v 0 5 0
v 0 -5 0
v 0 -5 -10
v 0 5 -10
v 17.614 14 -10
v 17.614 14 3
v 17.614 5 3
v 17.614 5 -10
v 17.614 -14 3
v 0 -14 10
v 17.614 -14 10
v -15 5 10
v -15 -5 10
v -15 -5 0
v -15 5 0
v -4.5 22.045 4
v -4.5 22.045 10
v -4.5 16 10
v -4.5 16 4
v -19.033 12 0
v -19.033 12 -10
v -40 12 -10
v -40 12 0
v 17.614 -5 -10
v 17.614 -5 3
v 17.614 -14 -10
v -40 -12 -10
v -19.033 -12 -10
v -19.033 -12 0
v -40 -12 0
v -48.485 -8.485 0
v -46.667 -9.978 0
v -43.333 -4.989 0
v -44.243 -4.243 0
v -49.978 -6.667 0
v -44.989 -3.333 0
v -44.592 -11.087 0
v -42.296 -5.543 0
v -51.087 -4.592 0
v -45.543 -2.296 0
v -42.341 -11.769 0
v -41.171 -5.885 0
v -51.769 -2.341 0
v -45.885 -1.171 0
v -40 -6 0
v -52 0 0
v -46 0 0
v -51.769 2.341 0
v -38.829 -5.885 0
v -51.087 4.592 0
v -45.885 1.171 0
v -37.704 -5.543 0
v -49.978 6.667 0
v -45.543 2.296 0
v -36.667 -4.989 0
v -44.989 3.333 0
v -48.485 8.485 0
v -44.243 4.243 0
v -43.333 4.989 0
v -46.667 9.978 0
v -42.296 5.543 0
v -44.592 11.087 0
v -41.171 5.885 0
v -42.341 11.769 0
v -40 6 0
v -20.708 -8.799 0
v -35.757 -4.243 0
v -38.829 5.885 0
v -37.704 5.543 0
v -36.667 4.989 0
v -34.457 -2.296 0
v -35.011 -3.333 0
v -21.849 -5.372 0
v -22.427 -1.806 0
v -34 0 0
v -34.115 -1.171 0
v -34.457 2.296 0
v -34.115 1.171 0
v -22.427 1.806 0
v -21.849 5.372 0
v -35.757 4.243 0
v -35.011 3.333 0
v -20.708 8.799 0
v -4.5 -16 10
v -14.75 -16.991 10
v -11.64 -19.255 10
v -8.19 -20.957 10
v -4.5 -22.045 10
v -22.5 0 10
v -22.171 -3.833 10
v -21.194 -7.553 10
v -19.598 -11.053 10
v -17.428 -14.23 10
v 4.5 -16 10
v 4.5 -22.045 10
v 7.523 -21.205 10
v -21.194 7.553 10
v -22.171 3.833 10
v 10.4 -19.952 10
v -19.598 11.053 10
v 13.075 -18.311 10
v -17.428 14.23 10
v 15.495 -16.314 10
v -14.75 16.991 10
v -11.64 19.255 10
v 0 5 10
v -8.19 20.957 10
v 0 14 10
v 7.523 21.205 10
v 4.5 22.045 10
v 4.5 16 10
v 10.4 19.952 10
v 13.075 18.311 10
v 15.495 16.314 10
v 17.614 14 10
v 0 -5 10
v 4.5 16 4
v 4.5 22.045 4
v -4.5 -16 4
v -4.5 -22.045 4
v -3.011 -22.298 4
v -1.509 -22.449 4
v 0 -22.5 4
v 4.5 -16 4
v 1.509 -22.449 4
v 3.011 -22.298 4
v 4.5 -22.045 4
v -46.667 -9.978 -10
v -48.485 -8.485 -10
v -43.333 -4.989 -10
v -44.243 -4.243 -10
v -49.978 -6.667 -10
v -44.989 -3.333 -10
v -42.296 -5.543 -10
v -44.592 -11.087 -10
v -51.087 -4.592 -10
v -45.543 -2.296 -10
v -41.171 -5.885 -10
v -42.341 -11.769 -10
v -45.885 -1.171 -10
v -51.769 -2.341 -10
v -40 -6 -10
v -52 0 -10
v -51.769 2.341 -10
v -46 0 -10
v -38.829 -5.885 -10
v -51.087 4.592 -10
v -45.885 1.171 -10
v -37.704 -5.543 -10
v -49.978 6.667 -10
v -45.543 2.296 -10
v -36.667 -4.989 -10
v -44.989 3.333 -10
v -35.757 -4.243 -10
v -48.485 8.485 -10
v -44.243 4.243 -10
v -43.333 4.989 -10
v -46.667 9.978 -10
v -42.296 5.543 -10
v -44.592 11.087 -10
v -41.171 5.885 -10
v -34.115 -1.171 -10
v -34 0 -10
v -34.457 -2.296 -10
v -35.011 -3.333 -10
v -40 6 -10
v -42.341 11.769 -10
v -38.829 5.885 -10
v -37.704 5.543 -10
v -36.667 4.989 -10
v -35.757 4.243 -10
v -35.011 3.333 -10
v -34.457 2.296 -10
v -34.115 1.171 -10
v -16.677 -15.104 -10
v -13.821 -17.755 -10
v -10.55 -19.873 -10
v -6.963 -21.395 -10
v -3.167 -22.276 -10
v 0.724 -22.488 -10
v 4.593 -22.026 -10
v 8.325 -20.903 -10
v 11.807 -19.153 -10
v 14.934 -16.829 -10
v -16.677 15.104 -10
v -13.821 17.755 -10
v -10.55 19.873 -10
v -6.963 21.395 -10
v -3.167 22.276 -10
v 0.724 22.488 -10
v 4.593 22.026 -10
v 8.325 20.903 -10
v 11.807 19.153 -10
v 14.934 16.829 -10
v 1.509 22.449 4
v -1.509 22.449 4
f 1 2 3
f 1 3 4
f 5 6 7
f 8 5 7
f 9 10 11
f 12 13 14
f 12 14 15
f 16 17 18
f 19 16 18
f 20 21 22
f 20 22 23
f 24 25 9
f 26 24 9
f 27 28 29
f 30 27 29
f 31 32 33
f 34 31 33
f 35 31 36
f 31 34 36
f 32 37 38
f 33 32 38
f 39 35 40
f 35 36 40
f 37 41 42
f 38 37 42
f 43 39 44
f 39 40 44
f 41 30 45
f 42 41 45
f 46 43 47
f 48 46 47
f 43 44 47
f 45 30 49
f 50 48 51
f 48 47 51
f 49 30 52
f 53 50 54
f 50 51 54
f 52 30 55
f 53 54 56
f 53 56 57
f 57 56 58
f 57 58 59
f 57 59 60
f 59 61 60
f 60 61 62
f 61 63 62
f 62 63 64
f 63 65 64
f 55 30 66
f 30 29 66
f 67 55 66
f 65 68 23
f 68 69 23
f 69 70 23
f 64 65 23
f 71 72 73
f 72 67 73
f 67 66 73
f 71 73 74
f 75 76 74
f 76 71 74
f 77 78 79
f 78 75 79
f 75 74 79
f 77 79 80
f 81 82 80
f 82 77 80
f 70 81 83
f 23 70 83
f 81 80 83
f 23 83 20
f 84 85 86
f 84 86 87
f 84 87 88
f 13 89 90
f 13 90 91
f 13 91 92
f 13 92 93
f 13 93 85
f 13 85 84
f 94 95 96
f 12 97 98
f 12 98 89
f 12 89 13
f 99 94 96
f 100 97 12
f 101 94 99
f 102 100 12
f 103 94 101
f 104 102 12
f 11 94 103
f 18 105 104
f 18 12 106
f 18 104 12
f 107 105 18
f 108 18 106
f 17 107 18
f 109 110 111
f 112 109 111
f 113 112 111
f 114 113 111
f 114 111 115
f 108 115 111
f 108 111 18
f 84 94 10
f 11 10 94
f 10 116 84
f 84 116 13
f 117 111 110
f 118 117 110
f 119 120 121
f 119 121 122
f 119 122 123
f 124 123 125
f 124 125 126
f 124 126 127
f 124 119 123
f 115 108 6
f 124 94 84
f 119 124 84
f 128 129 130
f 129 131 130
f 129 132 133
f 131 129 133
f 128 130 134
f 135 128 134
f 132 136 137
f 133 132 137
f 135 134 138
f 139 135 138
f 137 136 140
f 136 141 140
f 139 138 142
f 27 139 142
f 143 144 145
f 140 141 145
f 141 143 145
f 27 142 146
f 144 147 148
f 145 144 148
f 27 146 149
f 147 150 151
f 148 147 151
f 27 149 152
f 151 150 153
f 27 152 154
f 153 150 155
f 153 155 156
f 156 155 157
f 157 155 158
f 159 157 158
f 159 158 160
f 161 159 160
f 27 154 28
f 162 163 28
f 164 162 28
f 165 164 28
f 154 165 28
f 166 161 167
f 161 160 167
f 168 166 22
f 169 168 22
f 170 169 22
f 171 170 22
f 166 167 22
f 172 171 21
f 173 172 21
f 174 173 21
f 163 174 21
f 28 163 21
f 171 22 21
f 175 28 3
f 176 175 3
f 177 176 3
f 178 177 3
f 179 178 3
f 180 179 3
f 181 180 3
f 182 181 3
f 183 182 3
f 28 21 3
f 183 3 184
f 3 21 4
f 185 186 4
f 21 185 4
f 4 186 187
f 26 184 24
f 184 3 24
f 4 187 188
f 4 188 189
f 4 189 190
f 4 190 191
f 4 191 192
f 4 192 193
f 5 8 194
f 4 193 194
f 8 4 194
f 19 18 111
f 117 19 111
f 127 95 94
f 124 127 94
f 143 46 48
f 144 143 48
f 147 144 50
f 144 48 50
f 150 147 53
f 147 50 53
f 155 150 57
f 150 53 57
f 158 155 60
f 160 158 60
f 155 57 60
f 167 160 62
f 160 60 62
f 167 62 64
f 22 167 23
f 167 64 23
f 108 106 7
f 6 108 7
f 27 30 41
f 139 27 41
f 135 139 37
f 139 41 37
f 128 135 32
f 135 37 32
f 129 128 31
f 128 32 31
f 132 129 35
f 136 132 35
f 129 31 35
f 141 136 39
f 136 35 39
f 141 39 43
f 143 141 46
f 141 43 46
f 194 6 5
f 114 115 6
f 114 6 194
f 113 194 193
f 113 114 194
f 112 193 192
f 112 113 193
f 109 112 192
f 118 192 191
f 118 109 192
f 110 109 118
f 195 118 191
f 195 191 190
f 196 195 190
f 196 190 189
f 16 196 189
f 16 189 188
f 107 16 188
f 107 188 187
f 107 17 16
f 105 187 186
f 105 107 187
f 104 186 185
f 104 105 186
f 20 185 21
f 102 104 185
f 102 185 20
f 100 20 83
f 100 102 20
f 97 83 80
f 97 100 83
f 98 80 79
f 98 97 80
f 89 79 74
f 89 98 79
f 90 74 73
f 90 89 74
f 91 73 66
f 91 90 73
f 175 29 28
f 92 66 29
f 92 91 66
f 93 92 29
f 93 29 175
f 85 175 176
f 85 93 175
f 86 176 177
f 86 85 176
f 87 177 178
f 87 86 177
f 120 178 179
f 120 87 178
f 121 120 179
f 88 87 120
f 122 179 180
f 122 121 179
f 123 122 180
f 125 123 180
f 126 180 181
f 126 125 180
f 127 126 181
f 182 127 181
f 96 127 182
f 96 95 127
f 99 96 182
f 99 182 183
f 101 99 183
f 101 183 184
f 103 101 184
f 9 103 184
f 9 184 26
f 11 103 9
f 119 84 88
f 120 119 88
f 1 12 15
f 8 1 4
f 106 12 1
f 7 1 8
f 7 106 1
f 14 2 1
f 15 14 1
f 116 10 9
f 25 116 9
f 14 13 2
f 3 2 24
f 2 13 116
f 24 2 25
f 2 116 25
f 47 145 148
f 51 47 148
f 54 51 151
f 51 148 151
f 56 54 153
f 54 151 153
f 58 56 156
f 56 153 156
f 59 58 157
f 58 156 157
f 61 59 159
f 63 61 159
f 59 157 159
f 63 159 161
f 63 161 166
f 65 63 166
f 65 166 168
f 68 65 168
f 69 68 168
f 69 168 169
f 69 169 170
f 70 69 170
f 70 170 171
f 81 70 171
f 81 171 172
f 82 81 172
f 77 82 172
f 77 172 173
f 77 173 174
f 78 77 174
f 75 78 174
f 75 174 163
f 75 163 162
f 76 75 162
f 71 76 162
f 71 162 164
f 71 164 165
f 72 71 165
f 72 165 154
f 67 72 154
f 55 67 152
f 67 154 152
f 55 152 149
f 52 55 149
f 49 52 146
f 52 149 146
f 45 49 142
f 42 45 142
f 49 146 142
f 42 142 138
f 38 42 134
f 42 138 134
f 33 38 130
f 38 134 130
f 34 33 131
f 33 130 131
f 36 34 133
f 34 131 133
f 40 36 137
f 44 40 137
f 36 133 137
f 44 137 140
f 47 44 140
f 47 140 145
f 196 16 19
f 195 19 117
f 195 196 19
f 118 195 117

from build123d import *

# Parameters (mm, degrees)
F0_R      = 22.5
F1_DEPTH  = 10
F3_DEPTH  = 20.001
F5_DEPTH  = 6
F7_DEPTH  = 14
F8_W      = 37.5
F8_H      = 10
F9_DEPTH  = 10
F10_W     = 24
F10_H     = 10
F11_DEPTH = 52
F13_DEPTH = 10
F14_D     = 12


with BuildPart() as f1:
    # F0 (on Top) → F1 (new body, symmetric)
    with BuildSketch(Plane.XY):
        Circle(F0_R)
    extrude(amount=F1_DEPTH, both=True)

    # F2 (on face) → F3 (cut, through all)
    with BuildSketch(Plane.XY.offset(10)):
        with BuildLine():
            Line((17.6139149538, 14), (17.6139149538, -14))
            ThreePointArc((17.6139149538, -14), (21.2433882239, -7.4140715379), (22.5, 0))
            ThreePointArc((22.5, 0), (21.2433882239, 7.4140715379), (17.6139149538, 14))
        make_face()
    extrude(amount=-F3_DEPTH, mode=Mode.SUBTRACT)

    # F4 (on face) → F5 (cut)
    with BuildSketch(Plane.XY.offset(10)):
        with BuildLine():
            Line((4.5, -22.045407685), (4.5, -16))
            Line((4.5, -16), (-4.5, -16))
            Line((-4.5, -16), (-4.5, -22.045407685))
            ThreePointArc((-4.5, -22.045407685), (-2.2614516773, -22.3860634394), (-6.48e-08, -22.5))
            ThreePointArc((-6.48e-08, -22.5), (2.2614516129, -22.3860634459), (4.5, -22.045407685))
        make_face()
        with BuildLine():
            ThreePointArc((4.5, 22.045407685), (2.2614515402, 22.3860634532), (-2.11e-07, 22.5))
            ThreePointArc((-2.11e-07, 22.5), (-2.2614517501, 22.386063432), (-4.5, 22.045407685))
            Line((-4.5, 22.045407685), (-4.5, 16))
            Line((-4.5, 16), (4.5, 16))
            Line((4.5, 16), (4.5, 22.045407685))
        make_face()
    extrude(amount=-F5_DEPTH, mode=Mode.SUBTRACT)

    # F6 (on Front) → F7 (cut, symmetric)
    with BuildSketch(Plane.XZ):
        Polygon((17.6139149538, 3), (17.6139149538, 10), (0, 10), align=None)
    extrude(amount=F7_DEPTH, both=True, mode=Mode.SUBTRACT)

    # F8 (on Top) → F9 (cut, symmetric)
    with BuildSketch(Plane.XY):
        with Locations((3.75, 0)):
            Rectangle(F8_W, F8_H)
    extrude(amount=F9_DEPTH, both=True, mode=Mode.SUBTRACT)

    # F10 (on Right) → F11 (join)
    with BuildSketch(Plane.YZ):
        with Locations((0, -5)):
            Rectangle(F10_W, F10_H)
    extrude(amount=-F11_DEPTH)

    # F12 (on Top) → F13 (cut)
    with BuildSketch(Plane.XY):
        with BuildLine():
            Line((-40, 12), (-52, 12))
            Line((-52, 12), (-52, 0))
            ThreePointArc((-52, 0), (-48.4852813742, 8.4852813742), (-40, 12))
        make_face()
        with BuildLine():
            ThreePointArc((-40, -12), (-48.4852813742, -8.4852813742), (-52, 0))
            Line((-52, 0), (-52, -12))
            Line((-52, -12), (-40, -12))
        make_face()
    extrude(amount=-F13_DEPTH, mode=Mode.SUBTRACT)

    # F14 (through all)
    with Locations(Plane.XY):
        with Locations((-40, 0)):
            Hole(F14_D / 2)


solid = f1.part
